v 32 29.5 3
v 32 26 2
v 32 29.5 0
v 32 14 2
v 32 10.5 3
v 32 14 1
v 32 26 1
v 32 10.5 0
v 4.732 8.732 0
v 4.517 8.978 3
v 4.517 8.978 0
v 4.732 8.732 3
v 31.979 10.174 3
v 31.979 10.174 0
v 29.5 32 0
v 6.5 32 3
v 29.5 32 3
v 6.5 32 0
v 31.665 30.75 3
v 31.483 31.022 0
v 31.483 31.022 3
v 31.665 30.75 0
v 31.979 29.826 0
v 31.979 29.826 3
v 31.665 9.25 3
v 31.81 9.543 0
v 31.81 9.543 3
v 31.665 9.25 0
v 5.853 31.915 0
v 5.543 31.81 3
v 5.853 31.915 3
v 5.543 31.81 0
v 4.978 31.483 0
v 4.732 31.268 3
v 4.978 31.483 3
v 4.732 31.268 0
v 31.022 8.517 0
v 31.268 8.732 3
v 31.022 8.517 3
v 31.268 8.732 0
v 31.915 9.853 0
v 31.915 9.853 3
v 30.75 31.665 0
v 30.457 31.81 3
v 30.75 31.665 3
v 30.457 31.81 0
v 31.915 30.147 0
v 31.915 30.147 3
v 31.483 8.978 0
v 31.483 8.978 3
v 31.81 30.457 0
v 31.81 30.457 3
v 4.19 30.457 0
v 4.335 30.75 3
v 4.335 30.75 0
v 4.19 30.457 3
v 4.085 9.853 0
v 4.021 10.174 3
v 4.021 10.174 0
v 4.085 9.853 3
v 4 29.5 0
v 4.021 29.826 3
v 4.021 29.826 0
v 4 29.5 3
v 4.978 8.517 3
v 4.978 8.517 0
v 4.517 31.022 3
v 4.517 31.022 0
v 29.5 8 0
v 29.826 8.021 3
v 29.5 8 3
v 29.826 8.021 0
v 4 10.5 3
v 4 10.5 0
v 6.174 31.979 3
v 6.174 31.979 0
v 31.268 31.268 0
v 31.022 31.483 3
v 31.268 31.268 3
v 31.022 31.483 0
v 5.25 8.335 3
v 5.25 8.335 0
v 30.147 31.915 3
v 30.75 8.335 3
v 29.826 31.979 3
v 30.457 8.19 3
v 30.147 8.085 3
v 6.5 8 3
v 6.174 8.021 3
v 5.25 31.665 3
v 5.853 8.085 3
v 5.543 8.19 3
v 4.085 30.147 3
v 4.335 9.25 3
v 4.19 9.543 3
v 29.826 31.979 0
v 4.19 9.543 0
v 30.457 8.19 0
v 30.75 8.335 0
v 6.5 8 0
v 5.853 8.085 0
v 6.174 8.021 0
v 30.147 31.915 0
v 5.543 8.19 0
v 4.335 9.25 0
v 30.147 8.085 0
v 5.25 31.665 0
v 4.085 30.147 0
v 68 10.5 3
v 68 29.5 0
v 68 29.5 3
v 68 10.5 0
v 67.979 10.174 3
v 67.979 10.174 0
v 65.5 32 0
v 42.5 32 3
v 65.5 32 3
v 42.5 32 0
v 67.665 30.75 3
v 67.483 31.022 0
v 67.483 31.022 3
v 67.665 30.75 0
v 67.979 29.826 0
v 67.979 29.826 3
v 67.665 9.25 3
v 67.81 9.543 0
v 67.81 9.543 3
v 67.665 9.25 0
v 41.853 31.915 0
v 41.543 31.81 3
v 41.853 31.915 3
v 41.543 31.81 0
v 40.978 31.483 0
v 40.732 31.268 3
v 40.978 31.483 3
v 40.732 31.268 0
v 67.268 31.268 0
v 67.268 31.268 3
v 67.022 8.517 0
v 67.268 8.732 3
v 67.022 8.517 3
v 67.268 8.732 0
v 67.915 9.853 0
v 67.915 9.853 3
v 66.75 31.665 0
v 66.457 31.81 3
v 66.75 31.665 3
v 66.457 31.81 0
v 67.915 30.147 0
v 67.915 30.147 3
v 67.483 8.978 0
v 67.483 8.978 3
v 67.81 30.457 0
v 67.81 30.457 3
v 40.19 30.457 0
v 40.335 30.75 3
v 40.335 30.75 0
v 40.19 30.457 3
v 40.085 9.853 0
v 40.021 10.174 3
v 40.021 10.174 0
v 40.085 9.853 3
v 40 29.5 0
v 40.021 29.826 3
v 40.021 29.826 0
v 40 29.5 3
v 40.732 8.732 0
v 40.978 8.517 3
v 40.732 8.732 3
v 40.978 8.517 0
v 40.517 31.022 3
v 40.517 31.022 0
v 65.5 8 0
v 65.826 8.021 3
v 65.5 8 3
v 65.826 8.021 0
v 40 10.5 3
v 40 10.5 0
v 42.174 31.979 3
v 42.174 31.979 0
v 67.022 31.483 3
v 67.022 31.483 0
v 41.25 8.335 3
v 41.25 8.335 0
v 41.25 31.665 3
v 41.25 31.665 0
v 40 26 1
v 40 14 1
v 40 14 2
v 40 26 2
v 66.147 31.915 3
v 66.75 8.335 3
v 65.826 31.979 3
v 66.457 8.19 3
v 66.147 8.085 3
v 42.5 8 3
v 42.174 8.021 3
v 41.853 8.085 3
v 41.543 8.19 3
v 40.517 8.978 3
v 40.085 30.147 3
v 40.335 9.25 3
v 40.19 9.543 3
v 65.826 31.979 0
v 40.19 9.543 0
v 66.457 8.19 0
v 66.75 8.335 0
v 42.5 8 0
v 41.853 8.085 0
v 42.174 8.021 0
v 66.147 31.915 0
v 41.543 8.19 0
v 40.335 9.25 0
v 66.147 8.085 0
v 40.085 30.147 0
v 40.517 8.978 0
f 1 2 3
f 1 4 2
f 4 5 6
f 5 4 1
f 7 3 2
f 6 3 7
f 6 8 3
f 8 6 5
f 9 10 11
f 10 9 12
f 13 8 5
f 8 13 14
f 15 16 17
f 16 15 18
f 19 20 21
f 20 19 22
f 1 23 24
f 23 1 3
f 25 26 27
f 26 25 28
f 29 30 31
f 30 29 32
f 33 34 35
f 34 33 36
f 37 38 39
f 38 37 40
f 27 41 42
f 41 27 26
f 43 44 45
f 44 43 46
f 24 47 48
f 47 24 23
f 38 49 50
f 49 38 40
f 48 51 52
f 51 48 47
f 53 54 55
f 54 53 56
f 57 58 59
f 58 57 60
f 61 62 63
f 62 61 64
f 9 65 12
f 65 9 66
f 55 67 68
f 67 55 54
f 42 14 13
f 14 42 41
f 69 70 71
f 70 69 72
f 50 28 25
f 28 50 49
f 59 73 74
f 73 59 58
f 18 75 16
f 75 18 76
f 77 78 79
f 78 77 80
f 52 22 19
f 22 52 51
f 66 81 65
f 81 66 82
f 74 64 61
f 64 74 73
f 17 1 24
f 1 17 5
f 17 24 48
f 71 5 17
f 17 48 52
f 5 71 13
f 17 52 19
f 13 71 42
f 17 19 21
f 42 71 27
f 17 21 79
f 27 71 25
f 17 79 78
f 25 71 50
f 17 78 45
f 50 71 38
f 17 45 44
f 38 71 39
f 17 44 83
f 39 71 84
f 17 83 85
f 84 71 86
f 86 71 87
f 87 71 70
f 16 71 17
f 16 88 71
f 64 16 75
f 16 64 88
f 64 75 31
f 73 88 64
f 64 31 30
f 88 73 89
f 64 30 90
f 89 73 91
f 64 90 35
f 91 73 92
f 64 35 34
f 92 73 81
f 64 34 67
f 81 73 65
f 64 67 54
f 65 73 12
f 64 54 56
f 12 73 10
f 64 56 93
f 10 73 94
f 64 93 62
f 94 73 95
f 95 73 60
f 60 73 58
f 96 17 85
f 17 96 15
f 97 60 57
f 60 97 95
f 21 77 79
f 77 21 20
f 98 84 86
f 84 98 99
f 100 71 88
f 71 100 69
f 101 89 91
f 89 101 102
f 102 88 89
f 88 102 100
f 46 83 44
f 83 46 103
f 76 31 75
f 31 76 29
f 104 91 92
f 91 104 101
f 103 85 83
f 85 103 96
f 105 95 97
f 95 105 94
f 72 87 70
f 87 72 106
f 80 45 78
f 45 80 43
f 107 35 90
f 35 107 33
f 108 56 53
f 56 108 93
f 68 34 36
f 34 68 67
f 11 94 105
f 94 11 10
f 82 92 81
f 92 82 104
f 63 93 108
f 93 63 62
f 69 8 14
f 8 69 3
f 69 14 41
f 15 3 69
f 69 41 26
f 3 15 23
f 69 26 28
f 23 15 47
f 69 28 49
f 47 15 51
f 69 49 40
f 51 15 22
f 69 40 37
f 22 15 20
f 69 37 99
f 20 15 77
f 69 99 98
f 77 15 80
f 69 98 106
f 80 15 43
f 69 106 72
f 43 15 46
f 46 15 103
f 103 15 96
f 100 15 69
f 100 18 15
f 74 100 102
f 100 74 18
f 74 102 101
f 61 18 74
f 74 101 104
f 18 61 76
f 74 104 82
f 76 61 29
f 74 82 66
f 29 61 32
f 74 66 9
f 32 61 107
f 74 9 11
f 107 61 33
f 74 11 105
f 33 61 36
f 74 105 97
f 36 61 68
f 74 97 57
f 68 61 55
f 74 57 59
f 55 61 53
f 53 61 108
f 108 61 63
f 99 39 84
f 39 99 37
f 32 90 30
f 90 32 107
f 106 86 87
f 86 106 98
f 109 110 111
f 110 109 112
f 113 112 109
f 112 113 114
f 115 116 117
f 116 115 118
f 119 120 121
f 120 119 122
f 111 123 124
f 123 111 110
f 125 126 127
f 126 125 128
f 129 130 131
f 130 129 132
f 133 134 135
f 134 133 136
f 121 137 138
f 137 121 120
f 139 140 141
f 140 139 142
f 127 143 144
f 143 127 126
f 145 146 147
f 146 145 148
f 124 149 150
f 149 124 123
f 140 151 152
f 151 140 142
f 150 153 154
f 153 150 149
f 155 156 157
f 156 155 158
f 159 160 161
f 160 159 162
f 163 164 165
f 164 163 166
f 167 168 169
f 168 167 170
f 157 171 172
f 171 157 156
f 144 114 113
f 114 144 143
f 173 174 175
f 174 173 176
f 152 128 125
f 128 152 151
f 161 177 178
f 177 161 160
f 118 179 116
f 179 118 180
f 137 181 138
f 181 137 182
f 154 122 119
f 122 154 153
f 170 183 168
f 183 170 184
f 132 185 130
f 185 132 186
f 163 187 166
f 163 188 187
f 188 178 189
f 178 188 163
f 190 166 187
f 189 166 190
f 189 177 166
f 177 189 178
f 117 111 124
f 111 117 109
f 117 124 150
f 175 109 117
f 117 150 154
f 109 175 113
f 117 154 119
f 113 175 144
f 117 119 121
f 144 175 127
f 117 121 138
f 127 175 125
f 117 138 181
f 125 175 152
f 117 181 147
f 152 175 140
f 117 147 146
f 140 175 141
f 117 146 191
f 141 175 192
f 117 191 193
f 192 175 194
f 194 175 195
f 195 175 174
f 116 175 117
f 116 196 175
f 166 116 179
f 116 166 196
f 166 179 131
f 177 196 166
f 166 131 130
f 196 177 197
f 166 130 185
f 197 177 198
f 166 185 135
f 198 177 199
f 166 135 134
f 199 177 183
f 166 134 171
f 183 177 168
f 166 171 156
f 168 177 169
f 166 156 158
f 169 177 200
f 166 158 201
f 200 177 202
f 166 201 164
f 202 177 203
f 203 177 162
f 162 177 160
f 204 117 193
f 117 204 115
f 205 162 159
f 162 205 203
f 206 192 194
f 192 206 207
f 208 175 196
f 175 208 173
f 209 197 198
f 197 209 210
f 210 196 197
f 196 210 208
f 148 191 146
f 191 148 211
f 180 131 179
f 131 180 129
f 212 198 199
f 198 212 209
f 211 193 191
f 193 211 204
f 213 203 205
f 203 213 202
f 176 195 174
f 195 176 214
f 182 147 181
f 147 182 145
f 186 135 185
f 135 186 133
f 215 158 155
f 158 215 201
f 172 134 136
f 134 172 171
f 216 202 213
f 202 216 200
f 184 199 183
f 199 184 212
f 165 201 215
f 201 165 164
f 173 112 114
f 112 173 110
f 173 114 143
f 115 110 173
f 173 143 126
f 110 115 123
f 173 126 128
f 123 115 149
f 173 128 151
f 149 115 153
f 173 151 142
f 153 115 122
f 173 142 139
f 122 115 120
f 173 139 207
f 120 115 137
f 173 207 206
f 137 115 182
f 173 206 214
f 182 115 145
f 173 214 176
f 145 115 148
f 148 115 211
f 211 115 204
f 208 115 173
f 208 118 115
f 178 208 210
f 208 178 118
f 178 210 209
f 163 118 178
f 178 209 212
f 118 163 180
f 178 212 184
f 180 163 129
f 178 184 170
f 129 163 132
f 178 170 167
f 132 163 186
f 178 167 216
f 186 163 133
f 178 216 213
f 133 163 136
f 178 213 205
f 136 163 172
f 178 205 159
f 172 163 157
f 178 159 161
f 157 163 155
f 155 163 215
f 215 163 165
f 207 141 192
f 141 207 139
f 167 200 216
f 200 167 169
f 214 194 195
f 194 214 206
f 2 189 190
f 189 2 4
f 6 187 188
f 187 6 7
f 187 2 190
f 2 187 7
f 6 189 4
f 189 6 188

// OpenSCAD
/*
Sample 011: Dünnsteg-Festkörpergelenk — steif 1,0 mm
Generated from the FDM Mechanical Sample Library.
Units: millimetres.

Override examples:
  openscad -o custom.stl -D 'view="plate"' -D 'render_fn=64' model.scad
  openscad -o preview.png -D 'view="assembly"' model.scad
*/
use <../../../library/fdm_mechanisms.scad>

render_fn = is_undef(render_fn) ? 48 : render_fn;
view = is_undef(view) ? "plate" : view;
$fn = render_fn;

sample_flexure_hinge(
    view=view,
    beam_t=1,
    beam_w=12,
    gap=8
);
